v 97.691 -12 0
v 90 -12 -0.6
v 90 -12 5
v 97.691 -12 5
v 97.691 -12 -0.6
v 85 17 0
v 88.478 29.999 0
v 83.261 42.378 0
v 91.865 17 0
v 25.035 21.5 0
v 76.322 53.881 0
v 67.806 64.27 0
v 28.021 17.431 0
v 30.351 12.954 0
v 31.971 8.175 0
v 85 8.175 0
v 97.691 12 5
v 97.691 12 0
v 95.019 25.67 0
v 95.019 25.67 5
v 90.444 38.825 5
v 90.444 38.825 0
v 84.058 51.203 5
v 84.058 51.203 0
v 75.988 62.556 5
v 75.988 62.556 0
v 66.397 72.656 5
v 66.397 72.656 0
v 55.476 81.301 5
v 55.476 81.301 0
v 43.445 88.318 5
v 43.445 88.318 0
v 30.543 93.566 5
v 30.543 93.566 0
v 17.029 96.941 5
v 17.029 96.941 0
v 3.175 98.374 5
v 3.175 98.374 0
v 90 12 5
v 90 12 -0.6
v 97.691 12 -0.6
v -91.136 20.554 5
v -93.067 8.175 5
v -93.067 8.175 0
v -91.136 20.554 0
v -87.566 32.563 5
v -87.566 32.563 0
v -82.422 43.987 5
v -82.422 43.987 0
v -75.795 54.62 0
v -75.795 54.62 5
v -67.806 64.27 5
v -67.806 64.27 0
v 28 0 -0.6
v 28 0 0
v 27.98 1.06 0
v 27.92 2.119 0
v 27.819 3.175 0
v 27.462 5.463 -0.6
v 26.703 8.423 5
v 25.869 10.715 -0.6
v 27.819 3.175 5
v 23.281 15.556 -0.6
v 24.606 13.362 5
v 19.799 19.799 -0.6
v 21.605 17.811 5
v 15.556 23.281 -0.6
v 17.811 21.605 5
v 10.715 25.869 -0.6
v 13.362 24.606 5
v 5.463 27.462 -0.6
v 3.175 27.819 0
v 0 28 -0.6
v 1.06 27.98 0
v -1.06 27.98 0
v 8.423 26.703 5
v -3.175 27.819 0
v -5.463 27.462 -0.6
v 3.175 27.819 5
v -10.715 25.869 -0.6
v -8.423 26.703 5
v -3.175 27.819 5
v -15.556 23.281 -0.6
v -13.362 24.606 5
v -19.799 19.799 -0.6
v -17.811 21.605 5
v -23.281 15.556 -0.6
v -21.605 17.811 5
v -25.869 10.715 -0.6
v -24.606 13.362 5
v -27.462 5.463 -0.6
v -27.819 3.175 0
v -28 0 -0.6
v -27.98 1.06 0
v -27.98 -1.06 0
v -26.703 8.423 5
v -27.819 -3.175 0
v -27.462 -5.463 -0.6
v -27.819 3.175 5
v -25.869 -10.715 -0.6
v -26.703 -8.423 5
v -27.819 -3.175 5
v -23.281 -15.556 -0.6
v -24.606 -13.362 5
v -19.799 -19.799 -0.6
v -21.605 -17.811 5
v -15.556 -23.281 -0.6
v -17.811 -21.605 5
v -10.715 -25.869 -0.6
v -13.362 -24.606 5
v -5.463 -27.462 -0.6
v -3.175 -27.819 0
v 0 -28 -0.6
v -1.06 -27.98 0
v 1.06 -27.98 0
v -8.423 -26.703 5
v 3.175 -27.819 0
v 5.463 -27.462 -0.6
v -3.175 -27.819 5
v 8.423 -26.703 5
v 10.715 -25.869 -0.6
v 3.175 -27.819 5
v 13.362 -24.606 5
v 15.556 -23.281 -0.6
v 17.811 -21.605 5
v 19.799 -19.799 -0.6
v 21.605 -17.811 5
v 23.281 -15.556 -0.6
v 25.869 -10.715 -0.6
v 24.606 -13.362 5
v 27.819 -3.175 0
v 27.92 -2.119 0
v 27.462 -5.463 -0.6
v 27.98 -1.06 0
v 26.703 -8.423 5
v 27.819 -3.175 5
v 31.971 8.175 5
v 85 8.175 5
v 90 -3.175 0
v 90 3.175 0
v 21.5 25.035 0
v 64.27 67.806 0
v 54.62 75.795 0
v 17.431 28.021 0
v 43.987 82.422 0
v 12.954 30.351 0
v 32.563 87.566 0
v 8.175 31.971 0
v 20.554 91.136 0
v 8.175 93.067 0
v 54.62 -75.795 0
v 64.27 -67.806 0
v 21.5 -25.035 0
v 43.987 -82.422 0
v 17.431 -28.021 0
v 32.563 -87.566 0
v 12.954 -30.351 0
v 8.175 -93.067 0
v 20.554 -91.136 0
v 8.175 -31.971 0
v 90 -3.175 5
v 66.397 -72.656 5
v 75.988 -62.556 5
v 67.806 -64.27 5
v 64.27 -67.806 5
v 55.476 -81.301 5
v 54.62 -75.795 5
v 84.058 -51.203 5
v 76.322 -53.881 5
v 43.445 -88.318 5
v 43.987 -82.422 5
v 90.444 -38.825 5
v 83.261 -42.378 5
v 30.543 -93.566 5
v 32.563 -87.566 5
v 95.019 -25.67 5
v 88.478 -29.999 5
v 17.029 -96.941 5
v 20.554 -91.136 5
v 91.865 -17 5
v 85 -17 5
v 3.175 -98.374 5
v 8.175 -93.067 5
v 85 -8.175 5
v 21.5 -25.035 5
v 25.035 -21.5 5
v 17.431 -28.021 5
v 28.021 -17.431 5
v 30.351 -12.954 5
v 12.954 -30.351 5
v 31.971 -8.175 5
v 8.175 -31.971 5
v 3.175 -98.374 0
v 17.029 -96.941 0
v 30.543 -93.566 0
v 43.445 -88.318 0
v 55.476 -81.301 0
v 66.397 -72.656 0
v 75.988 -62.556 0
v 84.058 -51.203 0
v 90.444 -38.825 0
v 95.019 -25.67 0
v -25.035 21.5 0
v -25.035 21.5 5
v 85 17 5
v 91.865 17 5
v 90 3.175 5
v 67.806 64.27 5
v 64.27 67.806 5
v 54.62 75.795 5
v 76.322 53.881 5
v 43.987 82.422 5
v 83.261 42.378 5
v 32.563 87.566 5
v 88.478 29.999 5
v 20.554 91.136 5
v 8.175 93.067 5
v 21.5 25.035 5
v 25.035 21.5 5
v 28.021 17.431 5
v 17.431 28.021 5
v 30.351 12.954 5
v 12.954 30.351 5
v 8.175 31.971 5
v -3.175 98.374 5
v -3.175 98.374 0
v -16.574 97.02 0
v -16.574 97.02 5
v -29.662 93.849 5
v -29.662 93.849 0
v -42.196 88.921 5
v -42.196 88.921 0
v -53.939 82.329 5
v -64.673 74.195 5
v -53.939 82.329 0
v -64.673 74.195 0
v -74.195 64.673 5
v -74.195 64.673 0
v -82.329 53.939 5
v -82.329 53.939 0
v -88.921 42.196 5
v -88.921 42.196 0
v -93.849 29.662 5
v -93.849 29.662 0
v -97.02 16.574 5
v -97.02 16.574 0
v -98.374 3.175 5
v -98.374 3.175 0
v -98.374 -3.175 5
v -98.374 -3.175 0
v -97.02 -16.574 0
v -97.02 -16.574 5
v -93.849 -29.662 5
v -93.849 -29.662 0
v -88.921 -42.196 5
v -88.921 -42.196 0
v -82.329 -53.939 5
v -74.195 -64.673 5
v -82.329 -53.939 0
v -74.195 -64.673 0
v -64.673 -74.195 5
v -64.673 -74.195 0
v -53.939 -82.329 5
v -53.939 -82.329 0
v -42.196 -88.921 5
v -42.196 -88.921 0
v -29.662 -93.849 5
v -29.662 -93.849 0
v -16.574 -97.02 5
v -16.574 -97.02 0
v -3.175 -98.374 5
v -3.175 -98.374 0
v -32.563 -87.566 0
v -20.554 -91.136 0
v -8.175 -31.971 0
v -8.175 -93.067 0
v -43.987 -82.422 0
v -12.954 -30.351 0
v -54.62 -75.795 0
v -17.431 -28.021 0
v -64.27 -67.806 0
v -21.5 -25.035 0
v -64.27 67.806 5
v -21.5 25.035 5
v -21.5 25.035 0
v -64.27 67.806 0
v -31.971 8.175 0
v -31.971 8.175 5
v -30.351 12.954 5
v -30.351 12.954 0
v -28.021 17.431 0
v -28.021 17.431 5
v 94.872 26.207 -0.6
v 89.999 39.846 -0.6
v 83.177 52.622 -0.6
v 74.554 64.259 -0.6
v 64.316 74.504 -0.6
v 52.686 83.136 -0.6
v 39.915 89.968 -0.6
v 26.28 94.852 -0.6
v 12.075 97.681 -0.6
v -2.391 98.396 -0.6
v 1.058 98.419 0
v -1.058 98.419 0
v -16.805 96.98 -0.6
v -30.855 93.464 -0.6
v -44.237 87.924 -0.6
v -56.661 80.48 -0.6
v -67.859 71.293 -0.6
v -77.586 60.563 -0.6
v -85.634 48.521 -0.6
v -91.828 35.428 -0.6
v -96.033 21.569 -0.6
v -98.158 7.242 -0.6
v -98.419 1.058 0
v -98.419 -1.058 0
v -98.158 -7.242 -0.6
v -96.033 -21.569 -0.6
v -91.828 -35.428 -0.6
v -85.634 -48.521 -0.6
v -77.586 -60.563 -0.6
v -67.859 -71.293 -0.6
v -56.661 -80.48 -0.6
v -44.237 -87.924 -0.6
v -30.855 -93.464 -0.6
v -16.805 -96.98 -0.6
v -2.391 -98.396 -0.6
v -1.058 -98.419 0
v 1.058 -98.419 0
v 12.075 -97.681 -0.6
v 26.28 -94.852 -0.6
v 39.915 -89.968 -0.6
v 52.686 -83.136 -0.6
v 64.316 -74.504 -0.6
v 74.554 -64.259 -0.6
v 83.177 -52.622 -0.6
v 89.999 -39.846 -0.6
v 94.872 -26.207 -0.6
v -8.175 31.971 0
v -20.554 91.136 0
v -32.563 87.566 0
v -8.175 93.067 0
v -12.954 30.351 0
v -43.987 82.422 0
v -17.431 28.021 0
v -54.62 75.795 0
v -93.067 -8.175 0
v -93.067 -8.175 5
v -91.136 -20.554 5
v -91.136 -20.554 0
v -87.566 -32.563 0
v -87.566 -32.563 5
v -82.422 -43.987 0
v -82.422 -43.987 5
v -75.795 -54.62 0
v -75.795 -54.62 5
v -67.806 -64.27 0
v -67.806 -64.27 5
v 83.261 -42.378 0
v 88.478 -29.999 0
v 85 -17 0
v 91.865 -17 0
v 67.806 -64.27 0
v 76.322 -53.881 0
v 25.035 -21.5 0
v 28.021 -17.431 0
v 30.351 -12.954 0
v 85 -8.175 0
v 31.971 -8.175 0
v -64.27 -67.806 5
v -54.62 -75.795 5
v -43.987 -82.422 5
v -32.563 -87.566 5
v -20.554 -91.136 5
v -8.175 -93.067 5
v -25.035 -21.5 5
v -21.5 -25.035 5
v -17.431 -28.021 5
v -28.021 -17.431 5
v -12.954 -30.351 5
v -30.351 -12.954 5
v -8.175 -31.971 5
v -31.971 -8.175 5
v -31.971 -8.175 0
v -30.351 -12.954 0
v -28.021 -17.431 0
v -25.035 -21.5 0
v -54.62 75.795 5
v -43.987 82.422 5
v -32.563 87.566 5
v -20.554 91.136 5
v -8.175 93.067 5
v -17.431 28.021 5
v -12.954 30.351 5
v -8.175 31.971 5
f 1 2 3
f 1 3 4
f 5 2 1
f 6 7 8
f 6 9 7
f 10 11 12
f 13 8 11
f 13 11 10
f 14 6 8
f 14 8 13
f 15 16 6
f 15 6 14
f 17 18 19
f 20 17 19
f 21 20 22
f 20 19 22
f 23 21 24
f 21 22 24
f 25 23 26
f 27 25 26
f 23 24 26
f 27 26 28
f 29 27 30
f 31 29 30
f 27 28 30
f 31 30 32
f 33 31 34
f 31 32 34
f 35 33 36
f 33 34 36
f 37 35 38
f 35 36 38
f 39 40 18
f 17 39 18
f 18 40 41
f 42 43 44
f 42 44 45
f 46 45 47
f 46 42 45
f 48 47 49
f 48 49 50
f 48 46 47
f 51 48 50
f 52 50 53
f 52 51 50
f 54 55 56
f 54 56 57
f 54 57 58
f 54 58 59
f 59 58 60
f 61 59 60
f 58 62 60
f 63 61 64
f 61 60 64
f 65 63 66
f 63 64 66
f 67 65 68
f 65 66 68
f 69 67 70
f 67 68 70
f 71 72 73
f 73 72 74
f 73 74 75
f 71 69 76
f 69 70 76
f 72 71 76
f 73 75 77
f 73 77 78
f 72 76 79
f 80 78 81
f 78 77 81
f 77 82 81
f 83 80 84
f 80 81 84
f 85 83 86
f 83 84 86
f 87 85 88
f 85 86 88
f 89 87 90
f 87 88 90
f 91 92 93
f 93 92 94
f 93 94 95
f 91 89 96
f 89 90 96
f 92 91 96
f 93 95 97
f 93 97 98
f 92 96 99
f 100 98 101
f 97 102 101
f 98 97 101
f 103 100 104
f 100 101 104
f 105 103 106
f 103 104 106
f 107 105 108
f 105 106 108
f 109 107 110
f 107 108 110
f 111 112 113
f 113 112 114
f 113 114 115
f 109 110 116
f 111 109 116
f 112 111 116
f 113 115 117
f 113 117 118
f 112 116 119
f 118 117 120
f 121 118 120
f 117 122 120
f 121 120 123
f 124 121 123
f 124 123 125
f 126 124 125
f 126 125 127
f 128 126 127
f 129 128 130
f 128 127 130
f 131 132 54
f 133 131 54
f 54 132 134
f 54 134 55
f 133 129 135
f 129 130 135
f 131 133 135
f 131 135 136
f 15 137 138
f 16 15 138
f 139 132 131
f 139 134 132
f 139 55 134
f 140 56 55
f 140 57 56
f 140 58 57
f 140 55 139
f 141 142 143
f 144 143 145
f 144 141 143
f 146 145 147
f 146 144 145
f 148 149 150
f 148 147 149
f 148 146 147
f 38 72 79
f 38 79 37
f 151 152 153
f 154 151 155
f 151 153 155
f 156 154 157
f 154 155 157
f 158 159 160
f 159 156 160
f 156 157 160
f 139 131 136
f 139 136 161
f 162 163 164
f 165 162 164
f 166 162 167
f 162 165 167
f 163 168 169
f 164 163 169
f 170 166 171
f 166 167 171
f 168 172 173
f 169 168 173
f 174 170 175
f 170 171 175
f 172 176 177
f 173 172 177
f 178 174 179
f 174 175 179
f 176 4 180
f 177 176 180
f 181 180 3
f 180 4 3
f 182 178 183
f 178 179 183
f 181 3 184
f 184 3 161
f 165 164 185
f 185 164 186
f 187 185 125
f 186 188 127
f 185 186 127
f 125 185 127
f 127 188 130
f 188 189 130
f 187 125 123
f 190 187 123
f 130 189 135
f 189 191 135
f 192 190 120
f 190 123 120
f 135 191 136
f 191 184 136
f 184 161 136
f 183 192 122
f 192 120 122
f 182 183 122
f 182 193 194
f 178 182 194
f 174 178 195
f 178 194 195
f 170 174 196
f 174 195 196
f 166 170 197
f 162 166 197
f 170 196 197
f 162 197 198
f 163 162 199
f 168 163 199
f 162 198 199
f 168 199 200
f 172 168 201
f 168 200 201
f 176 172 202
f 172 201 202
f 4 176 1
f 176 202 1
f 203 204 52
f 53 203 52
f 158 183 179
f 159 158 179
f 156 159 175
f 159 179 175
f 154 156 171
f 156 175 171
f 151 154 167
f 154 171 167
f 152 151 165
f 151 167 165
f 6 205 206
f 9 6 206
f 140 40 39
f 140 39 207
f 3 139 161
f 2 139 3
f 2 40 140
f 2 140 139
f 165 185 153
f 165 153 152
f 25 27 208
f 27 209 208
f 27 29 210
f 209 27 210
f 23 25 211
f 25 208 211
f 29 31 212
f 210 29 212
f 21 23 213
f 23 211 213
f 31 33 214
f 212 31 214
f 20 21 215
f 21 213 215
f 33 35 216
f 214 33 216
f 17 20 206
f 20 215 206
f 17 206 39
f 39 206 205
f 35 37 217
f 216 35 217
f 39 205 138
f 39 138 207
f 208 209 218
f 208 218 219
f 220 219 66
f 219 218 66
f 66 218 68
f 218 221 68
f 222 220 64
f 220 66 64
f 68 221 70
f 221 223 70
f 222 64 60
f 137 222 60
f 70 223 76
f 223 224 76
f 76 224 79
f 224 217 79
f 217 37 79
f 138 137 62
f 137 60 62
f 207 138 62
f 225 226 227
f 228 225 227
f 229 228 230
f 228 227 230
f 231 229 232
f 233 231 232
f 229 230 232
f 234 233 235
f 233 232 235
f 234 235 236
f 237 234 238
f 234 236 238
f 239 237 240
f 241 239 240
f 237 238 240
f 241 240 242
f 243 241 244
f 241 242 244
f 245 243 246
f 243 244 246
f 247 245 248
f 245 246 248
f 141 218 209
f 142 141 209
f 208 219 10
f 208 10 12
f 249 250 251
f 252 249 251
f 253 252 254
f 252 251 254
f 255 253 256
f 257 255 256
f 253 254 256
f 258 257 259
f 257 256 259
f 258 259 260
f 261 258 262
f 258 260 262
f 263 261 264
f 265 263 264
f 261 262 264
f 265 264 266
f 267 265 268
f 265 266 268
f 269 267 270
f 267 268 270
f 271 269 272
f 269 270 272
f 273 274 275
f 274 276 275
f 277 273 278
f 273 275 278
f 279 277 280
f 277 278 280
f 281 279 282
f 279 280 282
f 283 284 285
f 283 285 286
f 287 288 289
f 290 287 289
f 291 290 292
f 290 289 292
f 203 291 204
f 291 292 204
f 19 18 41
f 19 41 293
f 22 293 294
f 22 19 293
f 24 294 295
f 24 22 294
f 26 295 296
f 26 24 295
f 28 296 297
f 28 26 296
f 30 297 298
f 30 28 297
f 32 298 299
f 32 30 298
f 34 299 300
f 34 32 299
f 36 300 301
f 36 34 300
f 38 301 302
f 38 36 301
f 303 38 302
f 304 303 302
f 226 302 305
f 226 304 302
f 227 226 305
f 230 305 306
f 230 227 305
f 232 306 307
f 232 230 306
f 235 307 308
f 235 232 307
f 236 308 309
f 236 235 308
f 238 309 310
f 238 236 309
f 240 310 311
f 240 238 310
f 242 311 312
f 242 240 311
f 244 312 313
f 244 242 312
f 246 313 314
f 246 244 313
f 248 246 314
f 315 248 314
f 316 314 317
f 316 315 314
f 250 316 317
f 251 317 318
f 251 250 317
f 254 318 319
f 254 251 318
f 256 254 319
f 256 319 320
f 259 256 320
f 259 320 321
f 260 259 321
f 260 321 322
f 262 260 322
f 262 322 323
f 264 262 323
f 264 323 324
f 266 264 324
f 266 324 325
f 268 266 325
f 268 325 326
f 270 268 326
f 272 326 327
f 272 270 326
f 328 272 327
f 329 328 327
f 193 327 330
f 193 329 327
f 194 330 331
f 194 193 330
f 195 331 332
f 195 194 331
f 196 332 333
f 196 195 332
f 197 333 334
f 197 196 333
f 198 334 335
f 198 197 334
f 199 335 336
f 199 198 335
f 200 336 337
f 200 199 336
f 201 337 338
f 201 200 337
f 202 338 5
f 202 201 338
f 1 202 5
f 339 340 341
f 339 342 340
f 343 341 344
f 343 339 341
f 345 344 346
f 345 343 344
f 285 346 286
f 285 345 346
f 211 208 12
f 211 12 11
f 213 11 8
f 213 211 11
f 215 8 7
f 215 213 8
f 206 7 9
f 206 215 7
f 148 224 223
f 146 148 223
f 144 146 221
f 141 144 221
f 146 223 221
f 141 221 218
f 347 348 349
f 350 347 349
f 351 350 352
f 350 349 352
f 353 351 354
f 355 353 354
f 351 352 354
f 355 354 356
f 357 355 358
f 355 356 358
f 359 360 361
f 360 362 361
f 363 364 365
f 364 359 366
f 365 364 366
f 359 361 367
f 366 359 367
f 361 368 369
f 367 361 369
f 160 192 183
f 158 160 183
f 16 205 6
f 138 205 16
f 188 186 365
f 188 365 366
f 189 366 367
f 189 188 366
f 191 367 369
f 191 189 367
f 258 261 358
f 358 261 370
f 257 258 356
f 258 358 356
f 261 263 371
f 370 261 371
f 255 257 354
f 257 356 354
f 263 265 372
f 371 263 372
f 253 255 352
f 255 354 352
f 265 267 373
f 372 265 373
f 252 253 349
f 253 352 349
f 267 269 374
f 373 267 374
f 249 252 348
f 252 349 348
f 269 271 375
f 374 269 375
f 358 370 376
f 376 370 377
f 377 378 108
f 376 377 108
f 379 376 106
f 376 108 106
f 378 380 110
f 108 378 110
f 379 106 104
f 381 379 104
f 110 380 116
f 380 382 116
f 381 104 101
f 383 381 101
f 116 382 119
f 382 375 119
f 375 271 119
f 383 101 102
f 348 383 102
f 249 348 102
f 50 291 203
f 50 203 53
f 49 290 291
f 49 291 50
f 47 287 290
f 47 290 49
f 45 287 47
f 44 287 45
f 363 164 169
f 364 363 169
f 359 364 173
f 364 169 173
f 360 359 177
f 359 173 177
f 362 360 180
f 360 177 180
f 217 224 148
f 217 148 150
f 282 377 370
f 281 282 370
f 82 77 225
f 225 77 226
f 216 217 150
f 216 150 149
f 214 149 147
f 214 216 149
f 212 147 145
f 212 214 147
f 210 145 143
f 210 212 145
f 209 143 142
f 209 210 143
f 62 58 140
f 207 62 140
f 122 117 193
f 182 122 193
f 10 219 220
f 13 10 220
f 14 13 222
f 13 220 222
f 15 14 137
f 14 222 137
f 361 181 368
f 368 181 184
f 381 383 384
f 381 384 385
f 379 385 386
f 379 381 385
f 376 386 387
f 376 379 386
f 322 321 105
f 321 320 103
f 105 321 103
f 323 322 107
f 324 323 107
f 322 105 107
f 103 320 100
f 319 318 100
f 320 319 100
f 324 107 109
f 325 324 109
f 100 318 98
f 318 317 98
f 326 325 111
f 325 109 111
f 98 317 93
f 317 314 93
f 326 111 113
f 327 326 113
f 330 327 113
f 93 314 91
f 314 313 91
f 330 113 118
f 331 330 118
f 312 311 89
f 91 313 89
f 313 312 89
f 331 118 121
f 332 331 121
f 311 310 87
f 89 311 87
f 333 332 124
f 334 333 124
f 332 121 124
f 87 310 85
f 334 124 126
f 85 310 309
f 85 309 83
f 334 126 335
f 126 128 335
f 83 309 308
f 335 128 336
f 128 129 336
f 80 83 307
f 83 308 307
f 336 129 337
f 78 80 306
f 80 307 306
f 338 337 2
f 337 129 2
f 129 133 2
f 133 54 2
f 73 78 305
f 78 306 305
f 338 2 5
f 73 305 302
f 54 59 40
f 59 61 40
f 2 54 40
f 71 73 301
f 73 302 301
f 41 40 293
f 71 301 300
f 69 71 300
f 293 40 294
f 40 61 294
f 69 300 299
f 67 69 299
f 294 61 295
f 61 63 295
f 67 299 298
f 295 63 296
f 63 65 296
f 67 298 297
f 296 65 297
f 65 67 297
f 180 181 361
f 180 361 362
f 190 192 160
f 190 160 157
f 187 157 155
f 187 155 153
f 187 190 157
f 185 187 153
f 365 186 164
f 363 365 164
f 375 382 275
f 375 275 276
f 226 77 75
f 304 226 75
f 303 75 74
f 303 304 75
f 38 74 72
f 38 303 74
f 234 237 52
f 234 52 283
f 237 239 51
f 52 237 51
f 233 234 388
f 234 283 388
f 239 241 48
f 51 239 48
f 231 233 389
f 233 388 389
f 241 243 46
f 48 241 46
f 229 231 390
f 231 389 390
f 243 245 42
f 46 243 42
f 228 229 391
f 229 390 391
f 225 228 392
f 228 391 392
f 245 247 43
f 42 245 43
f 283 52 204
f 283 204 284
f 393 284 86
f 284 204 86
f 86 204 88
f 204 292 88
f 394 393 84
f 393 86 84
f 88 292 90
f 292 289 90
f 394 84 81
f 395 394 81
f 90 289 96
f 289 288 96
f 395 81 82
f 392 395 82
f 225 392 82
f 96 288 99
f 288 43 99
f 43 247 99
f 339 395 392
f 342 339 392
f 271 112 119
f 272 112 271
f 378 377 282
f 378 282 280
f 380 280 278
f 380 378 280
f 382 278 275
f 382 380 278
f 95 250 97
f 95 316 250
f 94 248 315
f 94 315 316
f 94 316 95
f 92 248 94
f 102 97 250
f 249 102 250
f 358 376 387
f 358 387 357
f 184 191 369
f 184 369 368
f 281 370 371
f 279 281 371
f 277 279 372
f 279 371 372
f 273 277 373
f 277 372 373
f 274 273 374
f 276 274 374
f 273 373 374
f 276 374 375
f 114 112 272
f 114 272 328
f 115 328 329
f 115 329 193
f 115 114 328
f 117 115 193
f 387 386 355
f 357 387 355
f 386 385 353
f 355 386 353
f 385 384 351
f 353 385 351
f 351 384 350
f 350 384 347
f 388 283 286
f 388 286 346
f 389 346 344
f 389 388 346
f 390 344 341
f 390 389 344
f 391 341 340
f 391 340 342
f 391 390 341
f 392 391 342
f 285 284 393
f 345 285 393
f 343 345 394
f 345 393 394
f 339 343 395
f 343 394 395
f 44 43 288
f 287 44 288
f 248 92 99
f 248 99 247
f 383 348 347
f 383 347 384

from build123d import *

# Parameters (mm, degrees)
SKETCH_R           = 98.425
PAD_DEPTH          = 0.6
PAD001_DEPTH       = 5
POLARPATTERN_COUNT = 4
SKETCH002_R        = 28
POCKET_DEPTH       = 5.601
SKETCH003_W        = 15
SKETCH003_H        = 24
POCKET001_DEPTH    = 5.601
POCKET002_DEPTH    = 5
POCKET003_DEPTH    = 5


with BuildPart() as part:
    # Sketch → Pad (new body)
    with BuildSketch(Plane.XY):
        Circle(SKETCH_R)
    extrude(amount=-PAD_DEPTH)

    # Sketch001 → Pad001 (new body)
    with BuildSketch(Plane.XY):
        with BuildLine():
            ThreePointArc((3.175, -21.997045), (15.715448, -15.715448), (21.997045, -3.175))
            Line((21.997045, -3.175), (98.373777, -3.175))
            ThreePointArc((3.175, -98.373777), (69.596985, -69.596985), (98.373777, -3.175))
            Line((3.175, -21.997045), (3.175, -98.373777))
        make_face()
    pad001 = extrude(amount=PAD001_DEPTH)

    # PolarPattern: Pad001 ×4 about axis
    polarpattern_axis = Axis((0, 0, 0), (0, 0, 1))
    for i in range(1, POLARPATTERN_COUNT):
        add(pad001.rotate(polarpattern_axis, i * 360 / POLARPATTERN_COUNT))

    # Sketch002 → Pocket (cut, through all)
    with BuildSketch(Plane.XY.offset(5)):
        Circle(SKETCH002_R)
    extrude(amount=-POCKET_DEPTH, mode=Mode.SUBTRACT)

    # Sketch003 → Pocket001 (cut, through all)
    with BuildSketch(Plane(origin=(0, 0, -0.6), x_dir=(1, 0, 0), z_dir=(0, 0, -1))):
        with Locations((97.5, 0)):
            Rectangle(SKETCH003_W, SKETCH003_H)
    extrude(amount=-POCKET001_DEPTH, mode=Mode.SUBTRACT)

    # Sketch004 → Pocket002 (cut)
    with BuildSketch(Plane.XY.offset(5)):
        with BuildLine():
            ThreePointArc((8.175, -31.971384), (15.237308, -29.271564), (21.499759, -25.035183))
            Line((21.499759, -25.035183), (64.270084, -67.805508))
            ThreePointArc((8.175, -93.066643), (38.361488, -85.185837), (64.270084, -67.805508))
            Line((8.175, -31.971384), (8.175, -93.066643))
        make_face()
        with BuildLine():
            ThreePointArc((25.035284, -21.499641), (29.2716, -15.237239), (31.971384, -8.175))
            Line((31.971384, -8.175), (85, -8.175))
            Line((85, -17), (85, -8.175))
            Line((85, -17), (91.865285, -17))
            ThreePointArc((67.805615, -64.269971), (83.260505, -42.378284), (91.865285, -17))
            Line((25.035284, -21.499641), (67.805615, -64.269971))
        make_face()
    pocket002 = extrude(amount=-POCKET002_DEPTH, mode=Mode.SUBTRACT)

    # Mirrored: Pocket002 across Sketch004 H_Axis
    add(pocket002.mirror(Plane(origin=(0, 0, 5), x_dir=(0, 0, 1), z_dir=(0, 1, 0))), mode=Mode.SUBTRACT)

    # Sketch005 → Pocket003 (cut)
    with BuildSketch(Plane.XY.offset(5)):
        with BuildLine():
            ThreePointArc((-31.971384, -8.175), (-29.271564, -15.237308), (-25.035182, -21.49976))
            Line((-25.035182, -21.49976), (-67.805507, -64.270085))
            ThreePointArc((-93.066643, -8.175), (-85.185837, -38.361489), (-67.805507, -64.270085))
            Line((-93.066643, -8.175), (-31.971384, -8.175))
        make_face()
        with BuildLine():
            ThreePointArc((-21.49964, -25.035285), (-15.237238, -29.2716), (-8.175, -31.971384))
            Line((-8.175, -31.971384), (-8.175, -93.066643))
            ThreePointArc((-64.26997, -67.805616), (-38.361417, -85.185869), (-8.175, -93.066643))
            Line((-21.49964, -25.035285), (-64.26997, -67.805616))
        make_face()
    pocket003 = extrude(amount=-POCKET003_DEPTH, mode=Mode.SUBTRACT)

    # Mirrored001: Pocket003 across Sketch005 H_Axis
    add(pocket003.mirror(Plane(origin=(0, 0, 5), x_dir=(0, 0, 1), z_dir=(0, 1, 0))), mode=Mode.SUBTRACT)


solid = part.part
